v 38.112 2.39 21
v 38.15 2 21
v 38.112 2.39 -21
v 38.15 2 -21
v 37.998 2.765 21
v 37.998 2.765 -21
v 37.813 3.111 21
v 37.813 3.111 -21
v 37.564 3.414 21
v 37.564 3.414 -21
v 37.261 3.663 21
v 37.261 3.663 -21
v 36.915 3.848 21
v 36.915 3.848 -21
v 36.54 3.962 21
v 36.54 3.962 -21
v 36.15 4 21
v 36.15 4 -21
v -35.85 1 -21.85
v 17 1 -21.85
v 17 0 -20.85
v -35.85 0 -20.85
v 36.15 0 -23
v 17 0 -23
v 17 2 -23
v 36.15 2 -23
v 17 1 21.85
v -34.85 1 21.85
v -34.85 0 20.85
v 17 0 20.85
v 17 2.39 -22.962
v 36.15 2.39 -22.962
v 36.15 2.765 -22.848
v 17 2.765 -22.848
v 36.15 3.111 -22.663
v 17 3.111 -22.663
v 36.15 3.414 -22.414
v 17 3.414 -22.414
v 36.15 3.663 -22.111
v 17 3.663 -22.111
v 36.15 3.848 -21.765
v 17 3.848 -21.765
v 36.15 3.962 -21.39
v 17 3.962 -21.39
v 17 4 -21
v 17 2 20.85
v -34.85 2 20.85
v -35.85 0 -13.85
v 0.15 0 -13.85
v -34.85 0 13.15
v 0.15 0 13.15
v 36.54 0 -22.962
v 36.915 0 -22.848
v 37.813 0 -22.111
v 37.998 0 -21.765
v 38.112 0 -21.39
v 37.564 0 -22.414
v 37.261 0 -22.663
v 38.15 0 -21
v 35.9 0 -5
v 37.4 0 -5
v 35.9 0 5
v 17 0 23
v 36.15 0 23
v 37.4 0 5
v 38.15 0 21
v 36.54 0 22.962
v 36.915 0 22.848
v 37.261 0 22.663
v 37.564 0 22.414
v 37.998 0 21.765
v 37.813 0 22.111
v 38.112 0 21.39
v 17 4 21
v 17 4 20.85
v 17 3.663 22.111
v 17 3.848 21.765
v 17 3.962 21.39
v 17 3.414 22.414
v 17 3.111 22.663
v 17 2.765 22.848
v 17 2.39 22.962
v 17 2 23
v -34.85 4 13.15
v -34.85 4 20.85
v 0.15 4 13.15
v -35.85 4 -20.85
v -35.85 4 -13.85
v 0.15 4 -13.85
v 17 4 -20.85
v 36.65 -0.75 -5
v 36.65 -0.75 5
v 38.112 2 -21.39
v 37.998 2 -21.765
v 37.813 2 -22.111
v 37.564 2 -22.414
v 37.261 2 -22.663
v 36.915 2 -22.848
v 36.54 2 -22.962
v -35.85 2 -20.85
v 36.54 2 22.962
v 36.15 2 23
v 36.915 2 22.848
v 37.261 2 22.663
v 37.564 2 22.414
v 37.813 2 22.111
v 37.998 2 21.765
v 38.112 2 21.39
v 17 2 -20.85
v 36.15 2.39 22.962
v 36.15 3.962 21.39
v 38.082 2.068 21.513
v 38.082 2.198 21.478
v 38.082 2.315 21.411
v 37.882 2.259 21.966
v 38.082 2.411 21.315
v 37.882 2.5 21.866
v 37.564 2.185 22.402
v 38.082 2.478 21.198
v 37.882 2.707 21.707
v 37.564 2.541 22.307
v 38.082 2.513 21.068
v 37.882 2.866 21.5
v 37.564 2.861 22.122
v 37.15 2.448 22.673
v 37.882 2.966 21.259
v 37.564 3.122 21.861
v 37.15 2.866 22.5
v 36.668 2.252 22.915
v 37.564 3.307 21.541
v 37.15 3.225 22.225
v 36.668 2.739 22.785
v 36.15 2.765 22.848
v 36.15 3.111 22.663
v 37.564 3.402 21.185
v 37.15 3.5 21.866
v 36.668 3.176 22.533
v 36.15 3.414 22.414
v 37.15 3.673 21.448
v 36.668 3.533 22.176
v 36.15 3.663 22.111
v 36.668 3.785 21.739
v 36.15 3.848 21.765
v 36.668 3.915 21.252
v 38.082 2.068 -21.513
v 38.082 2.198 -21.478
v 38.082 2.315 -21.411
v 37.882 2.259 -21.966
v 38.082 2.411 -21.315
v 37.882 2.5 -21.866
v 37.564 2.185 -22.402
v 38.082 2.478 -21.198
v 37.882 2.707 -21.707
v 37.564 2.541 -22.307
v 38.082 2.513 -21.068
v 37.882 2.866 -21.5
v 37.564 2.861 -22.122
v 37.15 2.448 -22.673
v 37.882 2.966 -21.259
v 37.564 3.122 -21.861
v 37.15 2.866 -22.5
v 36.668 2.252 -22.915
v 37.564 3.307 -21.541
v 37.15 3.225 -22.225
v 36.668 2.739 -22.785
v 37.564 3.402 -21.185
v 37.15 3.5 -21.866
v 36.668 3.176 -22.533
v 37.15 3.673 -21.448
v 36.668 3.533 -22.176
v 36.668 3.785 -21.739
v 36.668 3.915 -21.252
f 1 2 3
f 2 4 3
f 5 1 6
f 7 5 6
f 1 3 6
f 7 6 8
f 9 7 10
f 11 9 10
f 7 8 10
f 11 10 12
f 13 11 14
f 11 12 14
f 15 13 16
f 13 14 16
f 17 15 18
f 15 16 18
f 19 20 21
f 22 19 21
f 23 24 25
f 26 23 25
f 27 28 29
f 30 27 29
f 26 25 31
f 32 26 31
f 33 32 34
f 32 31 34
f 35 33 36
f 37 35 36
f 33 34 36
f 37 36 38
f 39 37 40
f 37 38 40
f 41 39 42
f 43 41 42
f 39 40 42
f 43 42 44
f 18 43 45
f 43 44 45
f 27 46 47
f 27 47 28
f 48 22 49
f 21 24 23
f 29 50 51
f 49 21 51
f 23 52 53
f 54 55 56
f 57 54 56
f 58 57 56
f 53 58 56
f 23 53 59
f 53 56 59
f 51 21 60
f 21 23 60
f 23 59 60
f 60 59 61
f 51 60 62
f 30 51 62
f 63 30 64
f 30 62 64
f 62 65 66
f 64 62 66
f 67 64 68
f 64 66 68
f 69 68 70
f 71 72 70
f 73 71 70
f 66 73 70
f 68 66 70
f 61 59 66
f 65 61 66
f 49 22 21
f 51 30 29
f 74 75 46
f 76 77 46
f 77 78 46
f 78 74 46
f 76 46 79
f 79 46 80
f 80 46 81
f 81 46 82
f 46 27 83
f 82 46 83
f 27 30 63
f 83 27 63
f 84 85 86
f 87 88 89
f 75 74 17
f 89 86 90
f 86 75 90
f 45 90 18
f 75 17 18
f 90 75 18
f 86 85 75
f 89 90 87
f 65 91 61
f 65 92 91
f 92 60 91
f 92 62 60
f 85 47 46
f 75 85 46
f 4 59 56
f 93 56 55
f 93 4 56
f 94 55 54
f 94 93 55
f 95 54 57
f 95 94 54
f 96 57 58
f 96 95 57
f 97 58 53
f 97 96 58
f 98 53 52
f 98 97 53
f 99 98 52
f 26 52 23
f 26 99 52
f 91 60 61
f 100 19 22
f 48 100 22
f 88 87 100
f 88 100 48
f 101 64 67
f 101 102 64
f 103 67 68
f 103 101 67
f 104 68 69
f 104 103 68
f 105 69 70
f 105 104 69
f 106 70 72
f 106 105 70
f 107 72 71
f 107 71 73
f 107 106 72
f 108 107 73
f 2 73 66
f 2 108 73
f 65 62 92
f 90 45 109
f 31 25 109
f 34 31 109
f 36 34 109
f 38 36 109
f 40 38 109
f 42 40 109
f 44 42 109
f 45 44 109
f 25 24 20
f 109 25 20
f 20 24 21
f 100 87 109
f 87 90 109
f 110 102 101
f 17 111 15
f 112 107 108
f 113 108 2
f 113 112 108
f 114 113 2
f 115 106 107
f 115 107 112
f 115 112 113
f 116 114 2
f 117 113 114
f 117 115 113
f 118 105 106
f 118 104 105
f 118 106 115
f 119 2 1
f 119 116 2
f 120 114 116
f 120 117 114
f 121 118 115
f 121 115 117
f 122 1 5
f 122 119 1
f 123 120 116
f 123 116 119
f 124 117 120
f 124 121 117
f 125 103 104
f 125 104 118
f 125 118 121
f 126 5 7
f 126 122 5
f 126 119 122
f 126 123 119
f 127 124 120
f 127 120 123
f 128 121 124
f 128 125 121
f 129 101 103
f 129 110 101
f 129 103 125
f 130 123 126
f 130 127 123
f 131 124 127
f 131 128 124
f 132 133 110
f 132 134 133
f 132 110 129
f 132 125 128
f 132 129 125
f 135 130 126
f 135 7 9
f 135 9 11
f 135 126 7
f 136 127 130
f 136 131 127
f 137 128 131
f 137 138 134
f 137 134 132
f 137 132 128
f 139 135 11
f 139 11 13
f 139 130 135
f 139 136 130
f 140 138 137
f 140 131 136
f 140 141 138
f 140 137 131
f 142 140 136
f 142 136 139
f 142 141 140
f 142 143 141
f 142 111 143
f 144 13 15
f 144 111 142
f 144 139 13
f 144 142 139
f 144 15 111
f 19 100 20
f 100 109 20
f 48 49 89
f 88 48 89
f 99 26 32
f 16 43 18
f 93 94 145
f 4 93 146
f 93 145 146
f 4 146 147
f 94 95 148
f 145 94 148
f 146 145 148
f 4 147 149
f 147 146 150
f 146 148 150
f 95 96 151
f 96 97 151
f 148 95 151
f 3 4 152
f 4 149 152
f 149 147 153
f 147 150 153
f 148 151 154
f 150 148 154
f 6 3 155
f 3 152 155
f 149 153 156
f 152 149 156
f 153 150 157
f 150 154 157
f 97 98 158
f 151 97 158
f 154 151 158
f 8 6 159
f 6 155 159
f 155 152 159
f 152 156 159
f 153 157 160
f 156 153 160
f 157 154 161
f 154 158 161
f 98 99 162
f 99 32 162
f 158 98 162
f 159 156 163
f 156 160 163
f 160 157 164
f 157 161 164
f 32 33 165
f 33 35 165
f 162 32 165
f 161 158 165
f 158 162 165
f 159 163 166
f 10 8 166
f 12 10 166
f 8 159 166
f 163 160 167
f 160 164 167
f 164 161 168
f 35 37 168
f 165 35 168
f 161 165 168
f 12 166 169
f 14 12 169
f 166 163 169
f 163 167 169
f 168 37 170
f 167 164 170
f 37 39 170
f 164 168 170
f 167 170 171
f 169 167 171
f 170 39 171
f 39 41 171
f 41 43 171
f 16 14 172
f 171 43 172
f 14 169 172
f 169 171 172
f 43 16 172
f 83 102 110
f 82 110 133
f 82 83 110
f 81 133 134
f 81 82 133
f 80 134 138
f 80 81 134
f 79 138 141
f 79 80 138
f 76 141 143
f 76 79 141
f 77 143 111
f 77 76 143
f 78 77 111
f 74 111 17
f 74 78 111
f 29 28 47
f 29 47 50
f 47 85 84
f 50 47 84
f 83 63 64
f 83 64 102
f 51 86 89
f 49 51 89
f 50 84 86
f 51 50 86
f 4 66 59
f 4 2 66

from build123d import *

# Parameters (mm, degrees)
EXTRUDE_2_DEPTH     = 4
EXTRUDE_3_DEPTH     = 51.85
EXTRUDE_4_DEPTH     = 51.85
SKETCH_6_W          = 32
SKETCH_6_H          = 27
SKETCH_6_W_2        = 3
CUT_EXTRUDE_1_DEPTH = 4
SKETCH_7_W          = 46
SKETCH_7_H          = 4
EXTRUDE_5_DEPTH     = 1.15
EXTRUDE_6_DEPTH     = 5
EXTRUDE_7_DEPTH     = 1
FILLET_3_R          = 2


with BuildPart() as part:
    # 草图1 → 凸台-拉伸2 (new body)
    with BuildSketch(Plane(origin=(0, 0, 0), x_dir=(1, 0, 0), z_dir=(0, 1, 0))):
        Polygon((16.85, -20.85), (17, -20.85), (17, 20.85), (16.85, 20.85), (-34.85, 20.85), (-34.85, -20.85), align=None)
        Polygon((17, -20.85), (17, -21), (31, -21), (35, -21), (35, -18), (35, 18), (35, 21), (31, 21), (17, 21), (17, 20.85), align=None)
        Polygon((31, -21), (17, -21), (17, -23), (37, -23), (37, 23), (17, 23), (17, 21), (31, 21), (35, 21), (35, 18), (35, -18), (35, -21), align=None)
    extrude(amount=EXTRUDE_2_DEPTH)

    # 草图4 → 凸台-拉伸3 (add)
    with BuildSketch(Plane.ZY.offset(-17)):
        Polygon((-20.85, 2), (-21.85, 1), (-20.85, 0), align=None)
    extrude(amount=EXTRUDE_3_DEPTH)

    # 草图3 → 凸台-拉伸4 (add)
    with BuildSketch(Plane.ZY.offset(-17)):
        Polygon((20.85, 2), (21.85, 1), (20.85, 0), align=None)
    extrude(amount=EXTRUDE_4_DEPTH)

    # 草图6 → 切除-拉伸1 (cut)
    with BuildSketch(Plane(origin=(0, 4, 0), x_dir=(1, 0, 0), z_dir=(0, 1, 0))):
        with Locations((-15.85, 0.35)):
            Rectangle(SKETCH_6_W, SKETCH_6_H)
        with Locations((-33.35, 0.35)):
            Rectangle(SKETCH_6_W_2, SKETCH_6_H)
    extrude(amount=-CUT_EXTRUDE_1_DEPTH, mode=Mode.SUBTRACT)

    # 草图7 → 凸台-拉伸5 (add)
    with BuildSketch(Plane(origin=(37, 0, 0), x_dir=(0, 0, -1), z_dir=(1, 0, 0))):
        with Locations((0, 2)):
            Rectangle(SKETCH_7_W, SKETCH_7_H)
    extrude(amount=EXTRUDE_5_DEPTH)

    # 草图12 → 凸台-拉伸6 (add, symmetric)
    with BuildSketch(Plane.XY):
        Polygon((36.65, 0), (36.65, -0.75), (37.4, 0), align=None)
        Polygon((35.9, 0), (36.65, -0.75), (36.65, 0), align=None)
    extrude(amount=EXTRUDE_6_DEPTH, both=True)

    # 草图14 → 凸台-拉伸7 (add)
    with BuildSketch(Plane.ZY.offset(34.85)):
        Polygon((-13.85, 0), (-13.85, 4), (-20.85, 4), (-20.85, 2), (-21.85, 1), (-20.85, 0), align=None)
    extrude(amount=EXTRUDE_7_DEPTH)

    # 圆角3
    fillet_3_edges = [part.edges().sort_by_distance(p)[0] for p in [
        (27.575, 4, 23),
        (27.575, 4, -23),
        (38.15, 2, 23),
        (38.15, 2, -23),
        (38.15, 4, 0),
    ]]
    fillet(fillet_3_edges, radius=FILLET_3_R)


solid = part.part
